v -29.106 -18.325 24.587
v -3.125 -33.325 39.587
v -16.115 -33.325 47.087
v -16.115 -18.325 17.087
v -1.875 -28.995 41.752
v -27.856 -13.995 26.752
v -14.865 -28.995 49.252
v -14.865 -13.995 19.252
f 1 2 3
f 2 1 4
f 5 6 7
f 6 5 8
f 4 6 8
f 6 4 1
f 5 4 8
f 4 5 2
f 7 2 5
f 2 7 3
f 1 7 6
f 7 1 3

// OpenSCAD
// Generated by generate_scads.py
rotate([120,30,0]) {
  translate([-30,30,10]) {
    cube(size=[15,30,5], center=true);
  }
}
